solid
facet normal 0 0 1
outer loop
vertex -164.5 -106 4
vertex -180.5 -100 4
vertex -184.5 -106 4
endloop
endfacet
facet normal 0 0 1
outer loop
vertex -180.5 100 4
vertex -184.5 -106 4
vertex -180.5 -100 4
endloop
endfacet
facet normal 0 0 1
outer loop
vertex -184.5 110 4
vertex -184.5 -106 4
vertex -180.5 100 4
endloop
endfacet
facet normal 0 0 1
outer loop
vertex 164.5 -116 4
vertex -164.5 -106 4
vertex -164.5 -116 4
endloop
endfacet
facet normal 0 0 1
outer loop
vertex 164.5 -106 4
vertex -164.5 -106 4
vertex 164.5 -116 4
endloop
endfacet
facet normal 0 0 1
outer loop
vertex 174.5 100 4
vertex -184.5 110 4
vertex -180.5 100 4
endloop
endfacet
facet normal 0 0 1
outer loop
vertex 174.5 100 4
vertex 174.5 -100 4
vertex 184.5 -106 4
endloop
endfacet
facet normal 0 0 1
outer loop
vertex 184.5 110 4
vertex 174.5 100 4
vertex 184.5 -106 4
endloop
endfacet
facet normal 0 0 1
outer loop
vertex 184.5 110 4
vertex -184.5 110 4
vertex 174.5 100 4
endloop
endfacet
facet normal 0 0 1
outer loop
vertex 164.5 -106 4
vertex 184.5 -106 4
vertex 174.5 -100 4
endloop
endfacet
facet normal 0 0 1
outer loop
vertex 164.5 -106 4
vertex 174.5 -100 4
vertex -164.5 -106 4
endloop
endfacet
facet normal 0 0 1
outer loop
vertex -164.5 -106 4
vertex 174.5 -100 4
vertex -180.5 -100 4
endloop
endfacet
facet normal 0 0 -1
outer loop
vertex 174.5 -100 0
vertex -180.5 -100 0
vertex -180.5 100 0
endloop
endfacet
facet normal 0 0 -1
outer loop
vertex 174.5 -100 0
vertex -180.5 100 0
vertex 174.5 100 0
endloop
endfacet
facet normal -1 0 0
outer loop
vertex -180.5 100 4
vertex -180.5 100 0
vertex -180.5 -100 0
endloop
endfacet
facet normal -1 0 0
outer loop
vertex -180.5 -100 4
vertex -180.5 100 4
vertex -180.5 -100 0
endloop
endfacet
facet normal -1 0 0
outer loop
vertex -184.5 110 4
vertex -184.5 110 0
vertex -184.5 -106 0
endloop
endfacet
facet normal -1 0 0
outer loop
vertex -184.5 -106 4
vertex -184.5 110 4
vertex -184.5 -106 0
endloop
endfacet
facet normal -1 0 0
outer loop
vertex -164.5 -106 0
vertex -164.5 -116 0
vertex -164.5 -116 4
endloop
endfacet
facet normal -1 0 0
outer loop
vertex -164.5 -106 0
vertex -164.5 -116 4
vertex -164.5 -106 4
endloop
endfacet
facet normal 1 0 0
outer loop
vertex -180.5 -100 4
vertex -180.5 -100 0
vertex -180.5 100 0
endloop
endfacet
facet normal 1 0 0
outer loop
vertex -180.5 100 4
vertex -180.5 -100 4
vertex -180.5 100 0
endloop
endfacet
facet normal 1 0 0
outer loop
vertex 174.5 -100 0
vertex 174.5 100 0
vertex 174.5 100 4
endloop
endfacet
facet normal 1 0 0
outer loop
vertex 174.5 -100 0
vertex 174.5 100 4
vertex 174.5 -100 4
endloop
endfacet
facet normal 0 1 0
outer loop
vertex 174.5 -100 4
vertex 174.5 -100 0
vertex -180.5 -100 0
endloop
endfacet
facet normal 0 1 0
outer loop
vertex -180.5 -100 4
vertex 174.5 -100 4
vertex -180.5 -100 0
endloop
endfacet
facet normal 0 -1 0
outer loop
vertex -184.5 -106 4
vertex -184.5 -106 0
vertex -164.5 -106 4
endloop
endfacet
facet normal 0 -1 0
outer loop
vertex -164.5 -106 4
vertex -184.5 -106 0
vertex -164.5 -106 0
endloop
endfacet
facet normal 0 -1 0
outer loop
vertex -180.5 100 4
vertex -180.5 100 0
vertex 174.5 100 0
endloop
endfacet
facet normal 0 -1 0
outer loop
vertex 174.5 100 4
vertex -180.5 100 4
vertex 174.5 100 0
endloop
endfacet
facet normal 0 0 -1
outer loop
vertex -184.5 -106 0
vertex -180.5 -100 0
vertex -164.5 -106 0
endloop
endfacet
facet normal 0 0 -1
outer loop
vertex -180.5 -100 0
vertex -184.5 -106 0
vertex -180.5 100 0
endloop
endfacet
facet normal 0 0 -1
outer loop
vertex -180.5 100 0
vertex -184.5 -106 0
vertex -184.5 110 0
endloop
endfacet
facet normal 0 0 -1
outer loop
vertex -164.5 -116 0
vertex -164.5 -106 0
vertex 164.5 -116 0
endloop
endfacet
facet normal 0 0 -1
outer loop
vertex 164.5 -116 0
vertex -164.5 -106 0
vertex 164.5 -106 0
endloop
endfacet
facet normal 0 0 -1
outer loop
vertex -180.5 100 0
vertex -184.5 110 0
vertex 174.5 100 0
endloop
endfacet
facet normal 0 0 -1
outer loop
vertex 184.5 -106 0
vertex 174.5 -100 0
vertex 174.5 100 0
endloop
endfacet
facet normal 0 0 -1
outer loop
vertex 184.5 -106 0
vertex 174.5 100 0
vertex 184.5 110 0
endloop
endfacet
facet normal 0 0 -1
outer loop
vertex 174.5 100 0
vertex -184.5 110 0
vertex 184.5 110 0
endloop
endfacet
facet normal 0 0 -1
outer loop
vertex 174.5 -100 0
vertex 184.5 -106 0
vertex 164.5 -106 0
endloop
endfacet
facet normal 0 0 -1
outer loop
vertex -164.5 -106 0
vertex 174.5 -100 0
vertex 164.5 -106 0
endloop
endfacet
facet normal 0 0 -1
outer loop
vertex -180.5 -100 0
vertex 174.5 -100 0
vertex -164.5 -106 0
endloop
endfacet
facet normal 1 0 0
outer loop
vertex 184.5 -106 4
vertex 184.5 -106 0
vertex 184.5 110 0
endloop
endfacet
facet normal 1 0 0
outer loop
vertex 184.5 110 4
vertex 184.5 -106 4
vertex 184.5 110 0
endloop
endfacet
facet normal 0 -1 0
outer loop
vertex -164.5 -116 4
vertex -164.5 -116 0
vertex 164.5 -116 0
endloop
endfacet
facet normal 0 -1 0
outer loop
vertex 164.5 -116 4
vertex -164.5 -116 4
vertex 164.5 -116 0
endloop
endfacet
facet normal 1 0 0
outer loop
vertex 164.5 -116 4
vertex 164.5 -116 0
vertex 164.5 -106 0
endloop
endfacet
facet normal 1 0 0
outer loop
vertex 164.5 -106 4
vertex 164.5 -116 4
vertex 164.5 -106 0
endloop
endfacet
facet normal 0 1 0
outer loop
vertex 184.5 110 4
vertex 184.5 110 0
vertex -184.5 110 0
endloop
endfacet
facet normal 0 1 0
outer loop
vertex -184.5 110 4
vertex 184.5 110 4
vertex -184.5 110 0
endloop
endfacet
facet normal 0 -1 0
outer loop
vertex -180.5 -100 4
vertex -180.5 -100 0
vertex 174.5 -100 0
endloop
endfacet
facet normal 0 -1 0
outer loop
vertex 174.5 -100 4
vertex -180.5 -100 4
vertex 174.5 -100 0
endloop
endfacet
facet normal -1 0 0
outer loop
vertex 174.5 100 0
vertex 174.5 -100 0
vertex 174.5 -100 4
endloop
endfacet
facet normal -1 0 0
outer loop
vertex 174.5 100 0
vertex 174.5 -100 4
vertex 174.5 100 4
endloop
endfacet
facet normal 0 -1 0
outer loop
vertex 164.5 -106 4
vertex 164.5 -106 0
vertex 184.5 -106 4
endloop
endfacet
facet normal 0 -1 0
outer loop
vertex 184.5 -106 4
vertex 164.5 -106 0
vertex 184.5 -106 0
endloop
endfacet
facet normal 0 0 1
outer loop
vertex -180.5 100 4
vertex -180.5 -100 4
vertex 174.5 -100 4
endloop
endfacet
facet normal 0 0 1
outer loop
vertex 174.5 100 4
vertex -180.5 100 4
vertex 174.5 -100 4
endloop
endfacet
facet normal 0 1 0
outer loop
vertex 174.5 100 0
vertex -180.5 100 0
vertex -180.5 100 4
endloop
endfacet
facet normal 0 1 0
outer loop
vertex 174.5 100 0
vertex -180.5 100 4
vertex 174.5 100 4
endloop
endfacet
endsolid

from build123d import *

# Parameters (mm, degrees)
F0_W     = 4
F0_H     = 200
F0_W_2   = 329
F0_H_2   = 10
F0_W_3   = 10
F1_DEPTH = 4
F2_W     = 355
F2_H     = 200
F3_DEPTH = 4


with BuildPart() as f1:
    # F0 (on Top) → F1 (new body)
    with BuildSketch(Plane.XY):
        Polygon((-184.5, 100), (-180.5, 100), (174.5, 100), (184.5, 100), (184.5, 110), (-184.5, 110), align=None)
        with Locations((-182.5, 0)):
            Rectangle(F0_W, F0_H)
        Polygon((174.5, -100), (-180.5, -100), (-184.5, -100), (-184.5, -106), (-164.5, -106), (164.5, -106), (184.5, -106), (184.5, -100), align=None)
        with Locations((0, -111)):
            Rectangle(F0_W_2, F0_H_2)
        with Locations((179.5, 0)):
            Rectangle(F0_W_3, F0_H)
    extrude(amount=F1_DEPTH)


with BuildPart() as f3:
    # F2 (on face) → F3 (new body)
    with BuildSketch(Plane(origin=(0, 0, 0), x_dir=(1, 0, 0), z_dir=(0, 0, -1))):
        with Locations((-3, 0)):
            Rectangle(F2_W, F2_H)
    extrude(amount=-F3_DEPTH)


solid = Compound([f1.part, f3.part])
